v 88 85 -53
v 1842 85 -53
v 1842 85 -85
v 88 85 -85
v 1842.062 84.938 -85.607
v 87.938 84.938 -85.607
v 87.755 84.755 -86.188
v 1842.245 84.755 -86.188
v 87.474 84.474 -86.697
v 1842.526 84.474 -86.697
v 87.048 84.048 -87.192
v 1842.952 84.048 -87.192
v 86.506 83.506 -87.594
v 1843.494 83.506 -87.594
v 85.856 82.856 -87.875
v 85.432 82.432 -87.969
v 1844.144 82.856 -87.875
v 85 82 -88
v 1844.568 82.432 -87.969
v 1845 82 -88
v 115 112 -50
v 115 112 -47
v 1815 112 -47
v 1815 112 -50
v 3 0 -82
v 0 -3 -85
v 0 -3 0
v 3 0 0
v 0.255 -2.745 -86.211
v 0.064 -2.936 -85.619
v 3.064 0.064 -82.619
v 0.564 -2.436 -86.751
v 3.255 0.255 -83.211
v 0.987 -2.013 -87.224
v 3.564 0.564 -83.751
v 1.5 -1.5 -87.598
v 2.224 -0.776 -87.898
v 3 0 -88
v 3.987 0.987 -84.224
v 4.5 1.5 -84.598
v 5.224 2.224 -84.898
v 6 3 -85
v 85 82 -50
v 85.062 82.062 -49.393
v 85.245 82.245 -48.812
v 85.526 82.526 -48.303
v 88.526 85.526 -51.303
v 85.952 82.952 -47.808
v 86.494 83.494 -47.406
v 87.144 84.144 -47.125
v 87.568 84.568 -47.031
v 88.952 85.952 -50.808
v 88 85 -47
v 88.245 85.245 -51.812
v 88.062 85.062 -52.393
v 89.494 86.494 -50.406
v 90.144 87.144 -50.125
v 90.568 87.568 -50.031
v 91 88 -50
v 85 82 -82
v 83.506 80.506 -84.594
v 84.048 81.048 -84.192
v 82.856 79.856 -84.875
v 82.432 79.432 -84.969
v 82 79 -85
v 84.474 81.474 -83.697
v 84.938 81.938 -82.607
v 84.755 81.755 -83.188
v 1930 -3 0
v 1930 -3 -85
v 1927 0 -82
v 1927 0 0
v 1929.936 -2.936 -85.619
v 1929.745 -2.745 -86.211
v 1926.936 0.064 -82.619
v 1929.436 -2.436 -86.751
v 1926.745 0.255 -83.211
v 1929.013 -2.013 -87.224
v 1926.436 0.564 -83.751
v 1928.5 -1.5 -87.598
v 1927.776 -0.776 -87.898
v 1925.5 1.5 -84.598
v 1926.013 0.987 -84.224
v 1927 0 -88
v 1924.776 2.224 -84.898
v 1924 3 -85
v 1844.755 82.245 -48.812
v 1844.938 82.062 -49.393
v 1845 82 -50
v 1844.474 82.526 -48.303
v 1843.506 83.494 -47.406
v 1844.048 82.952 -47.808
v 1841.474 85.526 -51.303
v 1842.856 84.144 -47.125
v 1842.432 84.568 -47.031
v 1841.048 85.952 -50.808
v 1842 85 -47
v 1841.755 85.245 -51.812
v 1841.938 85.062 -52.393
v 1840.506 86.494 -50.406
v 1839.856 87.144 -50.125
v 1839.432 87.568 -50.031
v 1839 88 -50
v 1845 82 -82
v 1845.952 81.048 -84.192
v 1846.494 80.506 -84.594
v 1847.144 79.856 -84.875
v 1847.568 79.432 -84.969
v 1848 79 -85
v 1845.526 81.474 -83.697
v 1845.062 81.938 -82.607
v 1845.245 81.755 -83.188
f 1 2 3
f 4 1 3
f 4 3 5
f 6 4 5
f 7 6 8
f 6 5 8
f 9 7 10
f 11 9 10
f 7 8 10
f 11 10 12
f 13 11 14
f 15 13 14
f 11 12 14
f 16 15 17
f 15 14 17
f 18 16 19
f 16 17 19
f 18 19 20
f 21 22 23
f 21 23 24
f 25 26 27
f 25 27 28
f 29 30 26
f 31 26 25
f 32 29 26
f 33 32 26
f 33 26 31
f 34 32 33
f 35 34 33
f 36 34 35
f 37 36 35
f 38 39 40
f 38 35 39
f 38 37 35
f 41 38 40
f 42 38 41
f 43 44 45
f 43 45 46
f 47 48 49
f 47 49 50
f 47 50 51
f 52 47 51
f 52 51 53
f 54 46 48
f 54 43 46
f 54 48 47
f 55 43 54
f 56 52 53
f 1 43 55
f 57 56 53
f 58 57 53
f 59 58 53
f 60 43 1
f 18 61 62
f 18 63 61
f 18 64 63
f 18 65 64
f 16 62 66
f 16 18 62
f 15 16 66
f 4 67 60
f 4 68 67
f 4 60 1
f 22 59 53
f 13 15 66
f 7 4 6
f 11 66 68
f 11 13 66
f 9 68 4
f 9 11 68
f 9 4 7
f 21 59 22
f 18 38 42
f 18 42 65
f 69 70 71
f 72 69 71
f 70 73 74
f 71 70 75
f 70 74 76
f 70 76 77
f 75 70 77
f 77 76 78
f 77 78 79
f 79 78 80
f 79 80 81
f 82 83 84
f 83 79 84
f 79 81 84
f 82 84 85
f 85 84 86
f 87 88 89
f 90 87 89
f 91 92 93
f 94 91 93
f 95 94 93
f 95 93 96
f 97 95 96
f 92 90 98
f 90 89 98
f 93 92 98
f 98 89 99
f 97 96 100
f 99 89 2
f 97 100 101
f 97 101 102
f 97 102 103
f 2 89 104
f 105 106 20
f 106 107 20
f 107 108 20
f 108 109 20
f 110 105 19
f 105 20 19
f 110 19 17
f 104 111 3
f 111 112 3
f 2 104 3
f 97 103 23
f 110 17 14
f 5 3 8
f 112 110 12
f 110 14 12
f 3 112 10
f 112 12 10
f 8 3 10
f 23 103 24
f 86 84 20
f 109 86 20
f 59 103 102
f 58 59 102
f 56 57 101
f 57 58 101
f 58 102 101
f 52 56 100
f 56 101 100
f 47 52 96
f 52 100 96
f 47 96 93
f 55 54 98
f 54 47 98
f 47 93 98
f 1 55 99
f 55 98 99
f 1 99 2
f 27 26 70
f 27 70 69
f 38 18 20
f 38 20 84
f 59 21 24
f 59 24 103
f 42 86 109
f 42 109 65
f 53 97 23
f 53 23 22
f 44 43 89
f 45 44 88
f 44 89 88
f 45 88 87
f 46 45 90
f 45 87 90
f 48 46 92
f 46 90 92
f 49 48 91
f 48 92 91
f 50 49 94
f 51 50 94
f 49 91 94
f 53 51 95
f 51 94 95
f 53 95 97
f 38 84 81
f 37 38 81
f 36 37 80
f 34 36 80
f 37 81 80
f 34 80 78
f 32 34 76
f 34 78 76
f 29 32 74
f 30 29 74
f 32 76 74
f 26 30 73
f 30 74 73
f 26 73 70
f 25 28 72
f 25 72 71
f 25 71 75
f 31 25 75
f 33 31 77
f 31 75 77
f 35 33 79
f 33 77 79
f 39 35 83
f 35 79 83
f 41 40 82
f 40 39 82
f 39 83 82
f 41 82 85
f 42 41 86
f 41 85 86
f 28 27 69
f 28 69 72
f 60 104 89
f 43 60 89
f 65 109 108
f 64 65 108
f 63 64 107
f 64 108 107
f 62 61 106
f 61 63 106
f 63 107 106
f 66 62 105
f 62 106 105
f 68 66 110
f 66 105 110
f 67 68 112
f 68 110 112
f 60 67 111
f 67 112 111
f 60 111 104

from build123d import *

# Parameters (mm, degrees)
BOSS_EXTRUDE1_DEPTH = 1930
FILLET1_R           = 3
CUT_EXTRUDE1_DEPTH  = 88
CUT_EXTRUDE2_DEPTH  = 88


with BuildPart() as part:
    # Sketch1 → Boss-Extrude1 (new body)
    with BuildSketch(Plane(origin=(0, 0, 0), x_dir=(0, 0, -1), z_dir=(1, 0, 0))):
        Polygon((0, 0), (85, 0), (85, 82), (47, 82), (47, 112), (50, 112), (50, 85), (88, 85), (88, -3), (0, -3), align=None)
    extrude(amount=BOSS_EXTRUDE1_DEPTH)

    # Fillet1
    fillet1_edges = [part.edges().sort_by_distance(p)[0] for p in [
        (965, 0, -85),
        (965, 82, -85),
        (965, 82, -47),
        (965, 85, -50),
        (965, 85, -88),
        (965, -3, -88),
    ]]
    fillet(fillet1_edges, radius=FILLET1_R)

    # Sketch4 → Cut-Extrude1 (cut)
    with BuildSketch(Plane(origin=(0, 0, -88), x_dir=(-1, 0, 0), z_dir=(0, 0, -1))):
        Polygon((-1930, -3), (-1815, 112), (-1930, 112), align=None)
    extrude(amount=-CUT_EXTRUDE1_DEPTH, mode=Mode.SUBTRACT)

    # Sketch5 → Cut-Extrude2 (cut)
    with BuildSketch(Plane(origin=(0, 0, -88), x_dir=(-1, 0, 0), z_dir=(0, 0, -1))):
        Polygon((0, -3), (-115, 112), (0, 112), align=None)
    extrude(amount=-CUT_EXTRUDE2_DEPTH, mode=Mode.SUBTRACT)


solid = part.part
